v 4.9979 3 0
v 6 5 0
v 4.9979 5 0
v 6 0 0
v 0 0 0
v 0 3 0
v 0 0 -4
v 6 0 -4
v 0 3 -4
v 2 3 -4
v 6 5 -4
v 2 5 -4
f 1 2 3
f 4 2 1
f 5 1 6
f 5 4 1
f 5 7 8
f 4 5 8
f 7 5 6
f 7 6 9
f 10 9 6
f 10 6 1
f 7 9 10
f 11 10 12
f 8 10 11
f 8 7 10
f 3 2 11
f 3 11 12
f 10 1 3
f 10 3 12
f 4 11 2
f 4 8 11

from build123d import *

# Parameters (mm, degrees)
SKETCH1_W           = 6
SKETCH1_H           = 4
BOSS_EXTRUDE1_DEPTH = 3
BOSS_EXTRUDE2_DEPTH = 2


with BuildPart() as part:
    # Sketch1 → Boss-Extrude1 (new body)
    with BuildSketch(Plane(origin=(0, 0, 0), x_dir=(1, 0, 0), z_dir=(0, 1, 0))):
        with Locations((3, 2)):
            Rectangle(SKETCH1_W, SKETCH1_H)
    extrude(amount=BOSS_EXTRUDE1_DEPTH)

    # Sketch3 → Boss-Extrude2 (add)
    with BuildSketch(Plane(origin=(0, 3, 0), x_dir=(1, 0, 0), z_dir=(0, 1, 0))):
        Polygon((6, 4), (6, 0), (4.997854063, 0), (2, 4), align=None)
    extrude(amount=BOSS_EXTRUDE2_DEPTH)


solid = part.part
